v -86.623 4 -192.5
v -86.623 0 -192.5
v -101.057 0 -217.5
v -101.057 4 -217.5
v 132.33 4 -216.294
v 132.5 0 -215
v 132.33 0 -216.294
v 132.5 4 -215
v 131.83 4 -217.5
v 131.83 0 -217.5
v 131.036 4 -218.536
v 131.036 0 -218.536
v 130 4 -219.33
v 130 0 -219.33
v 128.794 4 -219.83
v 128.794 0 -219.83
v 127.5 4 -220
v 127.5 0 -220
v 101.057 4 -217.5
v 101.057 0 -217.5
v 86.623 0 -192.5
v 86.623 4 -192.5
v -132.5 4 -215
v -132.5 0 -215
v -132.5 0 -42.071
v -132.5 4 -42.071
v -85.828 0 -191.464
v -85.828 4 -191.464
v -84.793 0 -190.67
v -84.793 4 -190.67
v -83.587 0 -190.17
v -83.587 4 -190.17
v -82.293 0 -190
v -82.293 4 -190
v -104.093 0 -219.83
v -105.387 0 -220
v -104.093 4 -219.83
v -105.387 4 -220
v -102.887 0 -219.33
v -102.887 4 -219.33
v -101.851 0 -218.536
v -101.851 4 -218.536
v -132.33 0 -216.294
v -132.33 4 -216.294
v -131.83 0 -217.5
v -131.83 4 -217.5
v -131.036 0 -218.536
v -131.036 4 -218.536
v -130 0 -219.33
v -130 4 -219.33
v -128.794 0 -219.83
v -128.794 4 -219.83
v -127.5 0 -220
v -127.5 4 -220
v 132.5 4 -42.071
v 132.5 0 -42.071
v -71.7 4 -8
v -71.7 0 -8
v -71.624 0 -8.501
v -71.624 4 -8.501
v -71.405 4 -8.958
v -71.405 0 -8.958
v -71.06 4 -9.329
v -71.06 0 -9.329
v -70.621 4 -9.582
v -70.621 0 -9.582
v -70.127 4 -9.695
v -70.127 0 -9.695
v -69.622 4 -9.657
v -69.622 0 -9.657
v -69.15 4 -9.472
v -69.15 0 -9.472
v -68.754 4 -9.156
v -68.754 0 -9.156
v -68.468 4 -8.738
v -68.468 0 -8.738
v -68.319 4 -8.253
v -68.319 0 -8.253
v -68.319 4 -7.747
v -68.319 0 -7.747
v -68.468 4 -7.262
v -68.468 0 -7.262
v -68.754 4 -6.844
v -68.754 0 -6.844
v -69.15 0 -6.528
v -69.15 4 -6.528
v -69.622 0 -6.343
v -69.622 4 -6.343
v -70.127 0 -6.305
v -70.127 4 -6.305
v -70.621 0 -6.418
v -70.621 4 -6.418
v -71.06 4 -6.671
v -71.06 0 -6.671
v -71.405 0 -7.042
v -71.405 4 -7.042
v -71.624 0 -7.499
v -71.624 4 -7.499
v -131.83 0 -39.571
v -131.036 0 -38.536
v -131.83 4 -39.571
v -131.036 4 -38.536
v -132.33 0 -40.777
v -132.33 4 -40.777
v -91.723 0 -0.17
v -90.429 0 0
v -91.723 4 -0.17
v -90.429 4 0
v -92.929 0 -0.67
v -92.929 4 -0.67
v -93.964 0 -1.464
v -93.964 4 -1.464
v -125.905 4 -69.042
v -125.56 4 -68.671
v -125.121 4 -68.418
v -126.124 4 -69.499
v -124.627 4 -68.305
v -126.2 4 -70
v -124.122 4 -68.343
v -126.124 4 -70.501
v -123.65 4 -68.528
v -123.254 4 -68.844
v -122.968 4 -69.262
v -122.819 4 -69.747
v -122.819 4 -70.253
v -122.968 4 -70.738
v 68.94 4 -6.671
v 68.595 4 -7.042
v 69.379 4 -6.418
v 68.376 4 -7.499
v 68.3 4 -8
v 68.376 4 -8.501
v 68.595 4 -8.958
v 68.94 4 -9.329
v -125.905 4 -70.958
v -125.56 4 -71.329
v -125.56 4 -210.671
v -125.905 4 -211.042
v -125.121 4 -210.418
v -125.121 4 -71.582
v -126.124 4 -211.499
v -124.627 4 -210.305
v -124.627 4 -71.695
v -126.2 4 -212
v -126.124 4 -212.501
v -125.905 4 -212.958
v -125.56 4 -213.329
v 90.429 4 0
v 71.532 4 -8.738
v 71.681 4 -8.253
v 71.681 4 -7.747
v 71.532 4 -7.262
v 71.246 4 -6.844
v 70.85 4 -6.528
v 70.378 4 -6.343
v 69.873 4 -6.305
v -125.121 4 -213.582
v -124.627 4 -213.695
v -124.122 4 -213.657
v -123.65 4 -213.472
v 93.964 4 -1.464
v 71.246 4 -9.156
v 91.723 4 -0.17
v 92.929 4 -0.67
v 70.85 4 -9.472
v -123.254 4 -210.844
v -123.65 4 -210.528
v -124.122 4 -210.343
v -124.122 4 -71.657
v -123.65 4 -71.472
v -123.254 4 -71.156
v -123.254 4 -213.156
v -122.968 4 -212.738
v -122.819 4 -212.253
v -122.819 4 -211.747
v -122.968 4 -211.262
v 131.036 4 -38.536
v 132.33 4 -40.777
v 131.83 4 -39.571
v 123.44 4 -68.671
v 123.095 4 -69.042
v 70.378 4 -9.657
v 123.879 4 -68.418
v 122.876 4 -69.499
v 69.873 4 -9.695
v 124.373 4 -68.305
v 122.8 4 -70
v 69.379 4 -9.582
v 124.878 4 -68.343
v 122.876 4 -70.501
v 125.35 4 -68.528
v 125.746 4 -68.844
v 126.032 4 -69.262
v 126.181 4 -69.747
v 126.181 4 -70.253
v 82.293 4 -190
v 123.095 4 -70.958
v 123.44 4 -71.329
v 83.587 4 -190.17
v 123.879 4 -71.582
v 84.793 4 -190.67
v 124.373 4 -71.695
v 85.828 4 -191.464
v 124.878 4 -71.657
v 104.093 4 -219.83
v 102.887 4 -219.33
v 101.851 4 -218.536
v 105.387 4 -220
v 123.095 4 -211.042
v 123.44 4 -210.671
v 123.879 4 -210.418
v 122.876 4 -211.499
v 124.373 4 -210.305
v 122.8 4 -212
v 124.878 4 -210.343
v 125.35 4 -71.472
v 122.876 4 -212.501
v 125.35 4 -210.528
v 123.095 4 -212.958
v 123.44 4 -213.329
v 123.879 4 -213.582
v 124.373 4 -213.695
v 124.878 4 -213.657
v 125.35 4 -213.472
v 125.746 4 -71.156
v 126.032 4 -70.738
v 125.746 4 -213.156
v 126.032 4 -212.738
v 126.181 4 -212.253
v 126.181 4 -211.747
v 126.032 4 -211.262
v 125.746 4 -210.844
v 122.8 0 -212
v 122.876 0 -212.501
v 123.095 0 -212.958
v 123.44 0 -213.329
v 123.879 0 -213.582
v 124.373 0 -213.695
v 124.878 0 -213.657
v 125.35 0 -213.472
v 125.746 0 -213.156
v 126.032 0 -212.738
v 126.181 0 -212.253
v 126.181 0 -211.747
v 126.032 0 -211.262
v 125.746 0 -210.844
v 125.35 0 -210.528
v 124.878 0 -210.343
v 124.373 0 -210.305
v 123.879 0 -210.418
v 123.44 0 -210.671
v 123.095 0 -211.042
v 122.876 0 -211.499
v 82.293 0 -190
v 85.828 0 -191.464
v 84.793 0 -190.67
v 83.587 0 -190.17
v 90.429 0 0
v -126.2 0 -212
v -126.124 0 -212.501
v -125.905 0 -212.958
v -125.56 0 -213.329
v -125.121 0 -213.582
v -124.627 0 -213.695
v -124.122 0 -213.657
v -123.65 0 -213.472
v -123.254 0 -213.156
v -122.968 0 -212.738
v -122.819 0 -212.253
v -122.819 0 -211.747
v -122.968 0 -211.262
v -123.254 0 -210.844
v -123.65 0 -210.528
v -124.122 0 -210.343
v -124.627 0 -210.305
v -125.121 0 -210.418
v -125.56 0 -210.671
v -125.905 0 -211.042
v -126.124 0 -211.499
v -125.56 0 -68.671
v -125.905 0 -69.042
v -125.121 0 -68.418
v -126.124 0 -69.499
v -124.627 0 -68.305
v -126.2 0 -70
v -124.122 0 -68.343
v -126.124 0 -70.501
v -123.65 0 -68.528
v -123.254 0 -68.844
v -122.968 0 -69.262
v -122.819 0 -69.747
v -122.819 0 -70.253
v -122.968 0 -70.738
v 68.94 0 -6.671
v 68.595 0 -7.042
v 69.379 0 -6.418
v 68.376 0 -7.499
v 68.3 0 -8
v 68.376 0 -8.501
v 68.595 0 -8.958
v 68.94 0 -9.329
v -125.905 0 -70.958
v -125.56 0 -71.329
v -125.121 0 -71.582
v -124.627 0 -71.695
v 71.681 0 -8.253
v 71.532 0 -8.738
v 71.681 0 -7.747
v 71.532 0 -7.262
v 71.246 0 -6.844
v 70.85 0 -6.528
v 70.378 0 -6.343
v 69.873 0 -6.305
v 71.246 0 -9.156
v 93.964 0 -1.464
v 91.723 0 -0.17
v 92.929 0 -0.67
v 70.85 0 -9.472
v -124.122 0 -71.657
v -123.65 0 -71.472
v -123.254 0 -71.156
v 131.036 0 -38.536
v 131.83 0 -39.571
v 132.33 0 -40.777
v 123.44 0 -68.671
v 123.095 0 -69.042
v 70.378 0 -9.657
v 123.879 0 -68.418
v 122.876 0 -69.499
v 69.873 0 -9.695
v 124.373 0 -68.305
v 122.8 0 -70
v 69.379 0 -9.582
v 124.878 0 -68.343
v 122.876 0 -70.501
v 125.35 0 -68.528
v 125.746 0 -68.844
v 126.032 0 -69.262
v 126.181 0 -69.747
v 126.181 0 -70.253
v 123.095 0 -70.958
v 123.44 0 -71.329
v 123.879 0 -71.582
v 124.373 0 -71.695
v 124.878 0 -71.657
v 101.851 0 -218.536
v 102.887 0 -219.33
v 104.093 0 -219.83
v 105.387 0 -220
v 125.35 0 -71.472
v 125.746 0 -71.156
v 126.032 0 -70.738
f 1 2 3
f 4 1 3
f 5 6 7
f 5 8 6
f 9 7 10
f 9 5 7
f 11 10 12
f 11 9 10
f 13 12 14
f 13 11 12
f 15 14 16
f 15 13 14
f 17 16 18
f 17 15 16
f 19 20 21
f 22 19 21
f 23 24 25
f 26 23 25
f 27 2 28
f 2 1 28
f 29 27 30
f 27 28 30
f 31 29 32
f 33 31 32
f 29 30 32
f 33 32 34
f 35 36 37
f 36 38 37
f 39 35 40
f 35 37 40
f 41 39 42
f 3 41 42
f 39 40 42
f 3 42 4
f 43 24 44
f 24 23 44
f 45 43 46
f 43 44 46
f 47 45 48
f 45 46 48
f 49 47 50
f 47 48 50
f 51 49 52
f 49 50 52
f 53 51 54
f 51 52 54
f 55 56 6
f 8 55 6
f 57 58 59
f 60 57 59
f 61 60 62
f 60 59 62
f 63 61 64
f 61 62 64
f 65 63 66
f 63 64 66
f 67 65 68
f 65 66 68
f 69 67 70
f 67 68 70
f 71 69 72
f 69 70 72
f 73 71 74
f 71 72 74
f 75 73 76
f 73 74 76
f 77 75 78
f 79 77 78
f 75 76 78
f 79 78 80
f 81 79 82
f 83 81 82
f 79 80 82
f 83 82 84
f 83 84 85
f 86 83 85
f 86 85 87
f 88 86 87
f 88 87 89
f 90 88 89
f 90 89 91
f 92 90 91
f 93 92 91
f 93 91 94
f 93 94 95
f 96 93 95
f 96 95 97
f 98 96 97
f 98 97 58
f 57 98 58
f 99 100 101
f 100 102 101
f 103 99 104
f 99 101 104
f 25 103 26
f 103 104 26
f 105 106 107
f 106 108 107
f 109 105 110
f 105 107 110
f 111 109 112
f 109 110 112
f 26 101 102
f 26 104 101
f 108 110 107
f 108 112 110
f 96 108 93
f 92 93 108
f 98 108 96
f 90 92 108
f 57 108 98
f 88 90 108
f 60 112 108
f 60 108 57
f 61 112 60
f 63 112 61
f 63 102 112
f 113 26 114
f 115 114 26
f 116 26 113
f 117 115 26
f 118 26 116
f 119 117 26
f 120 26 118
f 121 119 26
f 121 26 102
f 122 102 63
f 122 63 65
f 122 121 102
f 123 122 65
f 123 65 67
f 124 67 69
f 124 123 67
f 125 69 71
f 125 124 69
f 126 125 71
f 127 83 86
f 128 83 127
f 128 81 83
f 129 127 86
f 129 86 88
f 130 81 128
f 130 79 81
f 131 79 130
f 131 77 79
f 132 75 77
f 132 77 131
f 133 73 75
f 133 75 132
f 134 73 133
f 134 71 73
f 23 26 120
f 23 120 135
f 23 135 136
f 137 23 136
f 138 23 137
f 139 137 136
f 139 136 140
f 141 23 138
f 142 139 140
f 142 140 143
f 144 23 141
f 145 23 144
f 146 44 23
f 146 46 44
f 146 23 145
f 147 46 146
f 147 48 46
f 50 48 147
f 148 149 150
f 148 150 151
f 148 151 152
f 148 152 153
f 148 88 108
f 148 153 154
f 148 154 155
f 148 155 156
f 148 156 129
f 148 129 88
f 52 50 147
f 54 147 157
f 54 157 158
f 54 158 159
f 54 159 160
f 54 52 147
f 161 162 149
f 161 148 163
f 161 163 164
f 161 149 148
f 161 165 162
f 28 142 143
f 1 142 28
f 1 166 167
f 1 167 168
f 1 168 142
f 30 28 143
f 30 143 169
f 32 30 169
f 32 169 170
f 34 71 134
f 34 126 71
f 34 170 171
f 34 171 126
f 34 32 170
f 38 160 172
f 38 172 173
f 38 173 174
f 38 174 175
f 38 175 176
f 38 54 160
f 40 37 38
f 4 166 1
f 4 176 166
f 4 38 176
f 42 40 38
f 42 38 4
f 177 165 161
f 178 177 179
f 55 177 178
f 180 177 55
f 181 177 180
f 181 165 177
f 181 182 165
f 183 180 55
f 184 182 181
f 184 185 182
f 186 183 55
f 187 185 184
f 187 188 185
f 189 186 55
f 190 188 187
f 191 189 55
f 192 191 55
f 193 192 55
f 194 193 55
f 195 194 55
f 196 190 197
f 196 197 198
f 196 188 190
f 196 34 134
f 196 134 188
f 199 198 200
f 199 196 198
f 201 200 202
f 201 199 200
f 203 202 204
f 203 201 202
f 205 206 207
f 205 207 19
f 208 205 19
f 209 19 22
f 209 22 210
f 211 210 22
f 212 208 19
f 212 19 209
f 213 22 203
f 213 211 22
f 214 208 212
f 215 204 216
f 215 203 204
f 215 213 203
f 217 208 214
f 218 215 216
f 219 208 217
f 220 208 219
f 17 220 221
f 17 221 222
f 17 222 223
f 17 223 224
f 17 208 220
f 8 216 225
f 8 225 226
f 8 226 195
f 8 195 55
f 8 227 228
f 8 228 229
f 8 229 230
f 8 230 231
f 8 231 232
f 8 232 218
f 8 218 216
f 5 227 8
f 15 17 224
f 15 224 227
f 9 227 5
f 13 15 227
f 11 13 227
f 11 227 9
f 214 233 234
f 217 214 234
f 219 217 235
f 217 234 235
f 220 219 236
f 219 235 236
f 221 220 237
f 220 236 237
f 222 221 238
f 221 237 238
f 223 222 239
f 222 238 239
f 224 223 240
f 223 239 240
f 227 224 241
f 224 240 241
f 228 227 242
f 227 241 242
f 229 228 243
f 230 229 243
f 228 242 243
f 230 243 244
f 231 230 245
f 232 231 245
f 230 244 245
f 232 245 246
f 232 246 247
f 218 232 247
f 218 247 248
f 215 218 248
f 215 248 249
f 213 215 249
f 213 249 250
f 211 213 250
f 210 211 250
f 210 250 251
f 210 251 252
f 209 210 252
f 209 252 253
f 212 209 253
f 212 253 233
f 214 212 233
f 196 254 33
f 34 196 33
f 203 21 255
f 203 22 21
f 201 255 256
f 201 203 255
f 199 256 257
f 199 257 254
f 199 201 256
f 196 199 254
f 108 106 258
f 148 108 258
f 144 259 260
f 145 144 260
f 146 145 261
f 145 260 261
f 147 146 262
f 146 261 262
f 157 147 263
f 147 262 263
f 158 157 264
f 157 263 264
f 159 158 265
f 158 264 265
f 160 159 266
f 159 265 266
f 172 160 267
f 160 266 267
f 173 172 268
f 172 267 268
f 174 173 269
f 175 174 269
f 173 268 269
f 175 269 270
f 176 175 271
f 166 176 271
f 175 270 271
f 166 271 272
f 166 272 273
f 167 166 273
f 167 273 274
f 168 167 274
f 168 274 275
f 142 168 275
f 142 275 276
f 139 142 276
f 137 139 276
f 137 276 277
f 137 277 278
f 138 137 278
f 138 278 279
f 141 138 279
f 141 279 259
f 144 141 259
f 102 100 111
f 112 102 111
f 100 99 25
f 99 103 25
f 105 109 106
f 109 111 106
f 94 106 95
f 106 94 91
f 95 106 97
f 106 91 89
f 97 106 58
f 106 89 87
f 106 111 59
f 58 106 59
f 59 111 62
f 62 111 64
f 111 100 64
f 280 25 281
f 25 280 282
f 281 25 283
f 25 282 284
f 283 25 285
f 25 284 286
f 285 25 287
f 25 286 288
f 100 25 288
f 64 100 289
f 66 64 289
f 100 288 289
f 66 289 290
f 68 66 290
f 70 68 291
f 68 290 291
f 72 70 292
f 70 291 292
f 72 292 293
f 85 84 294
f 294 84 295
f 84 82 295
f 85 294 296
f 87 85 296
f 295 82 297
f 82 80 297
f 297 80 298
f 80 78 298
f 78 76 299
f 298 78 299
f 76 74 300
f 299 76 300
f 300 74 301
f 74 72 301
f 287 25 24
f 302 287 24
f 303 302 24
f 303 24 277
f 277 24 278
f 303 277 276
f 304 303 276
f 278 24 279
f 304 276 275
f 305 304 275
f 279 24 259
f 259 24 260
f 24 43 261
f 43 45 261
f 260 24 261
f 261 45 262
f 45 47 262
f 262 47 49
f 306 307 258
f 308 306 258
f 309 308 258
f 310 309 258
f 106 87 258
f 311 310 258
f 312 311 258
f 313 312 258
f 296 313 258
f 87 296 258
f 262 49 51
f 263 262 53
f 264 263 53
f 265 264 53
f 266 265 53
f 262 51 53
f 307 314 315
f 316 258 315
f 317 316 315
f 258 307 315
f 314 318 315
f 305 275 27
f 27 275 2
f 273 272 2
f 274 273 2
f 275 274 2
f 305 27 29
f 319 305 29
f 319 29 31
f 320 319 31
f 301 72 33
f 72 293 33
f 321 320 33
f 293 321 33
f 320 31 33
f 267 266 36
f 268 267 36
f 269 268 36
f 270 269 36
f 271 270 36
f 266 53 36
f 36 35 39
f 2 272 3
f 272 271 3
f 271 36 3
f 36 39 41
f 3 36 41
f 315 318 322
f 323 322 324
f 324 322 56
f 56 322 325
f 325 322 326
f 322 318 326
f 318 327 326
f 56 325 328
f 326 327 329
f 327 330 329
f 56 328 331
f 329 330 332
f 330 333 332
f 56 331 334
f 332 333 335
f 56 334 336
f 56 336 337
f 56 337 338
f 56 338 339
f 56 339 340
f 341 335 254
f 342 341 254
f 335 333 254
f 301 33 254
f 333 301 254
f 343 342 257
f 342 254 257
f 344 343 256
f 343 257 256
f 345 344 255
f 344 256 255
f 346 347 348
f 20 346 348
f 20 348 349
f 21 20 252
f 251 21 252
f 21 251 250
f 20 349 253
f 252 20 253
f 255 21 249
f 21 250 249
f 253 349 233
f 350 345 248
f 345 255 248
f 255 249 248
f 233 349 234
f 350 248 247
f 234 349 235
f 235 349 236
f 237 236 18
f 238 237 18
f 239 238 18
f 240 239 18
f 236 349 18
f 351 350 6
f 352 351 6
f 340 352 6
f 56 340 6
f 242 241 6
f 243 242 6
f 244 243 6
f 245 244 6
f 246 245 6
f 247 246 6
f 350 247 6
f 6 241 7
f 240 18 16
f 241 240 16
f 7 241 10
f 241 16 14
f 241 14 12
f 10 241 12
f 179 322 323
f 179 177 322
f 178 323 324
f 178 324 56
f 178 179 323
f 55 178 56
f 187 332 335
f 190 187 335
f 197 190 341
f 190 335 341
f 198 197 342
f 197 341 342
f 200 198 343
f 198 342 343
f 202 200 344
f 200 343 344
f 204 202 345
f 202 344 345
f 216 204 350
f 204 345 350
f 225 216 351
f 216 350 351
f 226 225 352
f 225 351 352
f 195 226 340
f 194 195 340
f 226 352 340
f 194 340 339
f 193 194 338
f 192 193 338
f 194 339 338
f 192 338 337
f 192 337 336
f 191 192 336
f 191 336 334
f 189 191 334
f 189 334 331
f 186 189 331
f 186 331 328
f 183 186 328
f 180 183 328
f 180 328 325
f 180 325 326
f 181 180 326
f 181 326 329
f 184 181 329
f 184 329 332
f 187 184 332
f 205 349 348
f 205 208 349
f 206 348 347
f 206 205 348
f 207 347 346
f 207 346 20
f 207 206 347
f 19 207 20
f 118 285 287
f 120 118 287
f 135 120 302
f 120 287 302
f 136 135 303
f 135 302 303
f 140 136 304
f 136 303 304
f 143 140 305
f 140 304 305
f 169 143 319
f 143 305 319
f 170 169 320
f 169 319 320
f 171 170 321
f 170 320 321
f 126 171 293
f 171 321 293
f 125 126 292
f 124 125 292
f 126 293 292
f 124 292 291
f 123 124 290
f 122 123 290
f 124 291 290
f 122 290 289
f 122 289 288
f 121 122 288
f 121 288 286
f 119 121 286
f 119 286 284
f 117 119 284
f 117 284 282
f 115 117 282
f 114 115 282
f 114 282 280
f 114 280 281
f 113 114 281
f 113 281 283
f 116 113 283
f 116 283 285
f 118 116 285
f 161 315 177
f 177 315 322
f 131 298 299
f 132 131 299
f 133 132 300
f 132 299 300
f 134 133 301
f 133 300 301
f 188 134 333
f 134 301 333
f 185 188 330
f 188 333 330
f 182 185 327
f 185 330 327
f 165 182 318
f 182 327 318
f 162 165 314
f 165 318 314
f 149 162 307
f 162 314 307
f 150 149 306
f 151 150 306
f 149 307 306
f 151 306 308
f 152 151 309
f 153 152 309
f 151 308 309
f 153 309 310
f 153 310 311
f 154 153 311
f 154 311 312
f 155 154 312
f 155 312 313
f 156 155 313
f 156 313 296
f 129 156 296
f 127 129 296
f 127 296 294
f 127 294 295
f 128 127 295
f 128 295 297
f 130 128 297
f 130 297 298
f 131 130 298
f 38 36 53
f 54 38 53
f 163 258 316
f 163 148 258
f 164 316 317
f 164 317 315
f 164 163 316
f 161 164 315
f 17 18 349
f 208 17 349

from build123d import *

# Parameters (mm, degrees)
BOSS_EXTRU_1_DEPTH      = 4
ESQUISSE2_R             = 1
ENL_V_MAT_EXTRU_1_DEPTH = 257.850637531
D_GAGEMENT_M31_D        = 3.4
D_GAGEMENT_M31_DEPTH    = 10
D_GAGEMENT_M31_TIP      = 1.021463052
CONG_1_R                = 5


with BuildPart() as part:
    # Esquisse1 → Boss.-Extru.1 (new body)
    with BuildSketch(Plane(origin=(0, 0, 0), x_dir=(1, 0, 0), z_dir=(0, 1, 0))):
        Polygon((-92.5, 0), (92.5, 0), (132.5, 40), (132.5, 220), (102.5, 220), (85.179491924, 190), (-85.179491924, 190), (-102.5, 220), (-132.5, 220), (-132.5, 40), align=None)
    extrude(amount=BOSS_EXTRU_1_DEPTH)

    # Esquisse2 → Enlèv. mat.-Extru.1 (cut, through all)
    with BuildSketch(Plane(origin=(0, 4, 0), x_dir=(1, 0, 0), z_dir=(0, 1, 0))):
        with Locations(Location((70, 8, 0), (0, 0, 270))):
            Circle(ESQUISSE2_R)
        with Locations(Location((124.5, 70, 0), (0, 0, 270))):
            Circle(ESQUISSE2_R)
        with Locations(Location((124.5, 212, 0), (0, 0, 270))):
            Circle(ESQUISSE2_R)
        with Locations(Location((-70, 8, 0), (0, 0, 90))):
            Circle(ESQUISSE2_R)
        with Locations(Location((-124.5, 70, 0), (0, 0, 90))):
            Circle(ESQUISSE2_R)
        with Locations(Location((-124.5, 212, 0), (0, 0, 90))):
            Circle(ESQUISSE2_R)
    extrude(amount=-ENL_V_MAT_EXTRU_1_DEPTH, mode=Mode.SUBTRACT)

    # Dégagement M31
    with Locations(Plane(origin=(0, 4, 0), x_dir=(1, 0, 0), z_dir=(0, 1, 0))):
        with Locations((-70, 8), (70, 8), (124.5, 70), (124.5, 212), (-124.5, 212), (-124.5, 70)):
            Hole(D_GAGEMENT_M31_D / 2, depth=D_GAGEMENT_M31_DEPTH)
            with Locations((0, 0, -(D_GAGEMENT_M31_DEPTH + D_GAGEMENT_M31_TIP / 2))):  # 118° drill point
                Cone(0, D_GAGEMENT_M31_D / 2, D_GAGEMENT_M31_TIP, mode=Mode.SUBTRACT)

    # Congé1
    cong_1_edges = [part.edges().sort_by_distance(p)[0] for p in [
        (132.5, 2, -220),
        (132.5, 2, -40),
        (92.5, 2, 0),
        (-92.5, 2, 0),
        (-132.5, 2, -40),
        (-132.5, 2, -220),
        (-102.5, 2, -220),
        (-85.179491924, 2, -190),
        (85.179491924, 2, -190),
        (102.5, 2, -220),
    ]]
    fillet(cong_1_edges, radius=CONG_1_R)


solid = part.part
